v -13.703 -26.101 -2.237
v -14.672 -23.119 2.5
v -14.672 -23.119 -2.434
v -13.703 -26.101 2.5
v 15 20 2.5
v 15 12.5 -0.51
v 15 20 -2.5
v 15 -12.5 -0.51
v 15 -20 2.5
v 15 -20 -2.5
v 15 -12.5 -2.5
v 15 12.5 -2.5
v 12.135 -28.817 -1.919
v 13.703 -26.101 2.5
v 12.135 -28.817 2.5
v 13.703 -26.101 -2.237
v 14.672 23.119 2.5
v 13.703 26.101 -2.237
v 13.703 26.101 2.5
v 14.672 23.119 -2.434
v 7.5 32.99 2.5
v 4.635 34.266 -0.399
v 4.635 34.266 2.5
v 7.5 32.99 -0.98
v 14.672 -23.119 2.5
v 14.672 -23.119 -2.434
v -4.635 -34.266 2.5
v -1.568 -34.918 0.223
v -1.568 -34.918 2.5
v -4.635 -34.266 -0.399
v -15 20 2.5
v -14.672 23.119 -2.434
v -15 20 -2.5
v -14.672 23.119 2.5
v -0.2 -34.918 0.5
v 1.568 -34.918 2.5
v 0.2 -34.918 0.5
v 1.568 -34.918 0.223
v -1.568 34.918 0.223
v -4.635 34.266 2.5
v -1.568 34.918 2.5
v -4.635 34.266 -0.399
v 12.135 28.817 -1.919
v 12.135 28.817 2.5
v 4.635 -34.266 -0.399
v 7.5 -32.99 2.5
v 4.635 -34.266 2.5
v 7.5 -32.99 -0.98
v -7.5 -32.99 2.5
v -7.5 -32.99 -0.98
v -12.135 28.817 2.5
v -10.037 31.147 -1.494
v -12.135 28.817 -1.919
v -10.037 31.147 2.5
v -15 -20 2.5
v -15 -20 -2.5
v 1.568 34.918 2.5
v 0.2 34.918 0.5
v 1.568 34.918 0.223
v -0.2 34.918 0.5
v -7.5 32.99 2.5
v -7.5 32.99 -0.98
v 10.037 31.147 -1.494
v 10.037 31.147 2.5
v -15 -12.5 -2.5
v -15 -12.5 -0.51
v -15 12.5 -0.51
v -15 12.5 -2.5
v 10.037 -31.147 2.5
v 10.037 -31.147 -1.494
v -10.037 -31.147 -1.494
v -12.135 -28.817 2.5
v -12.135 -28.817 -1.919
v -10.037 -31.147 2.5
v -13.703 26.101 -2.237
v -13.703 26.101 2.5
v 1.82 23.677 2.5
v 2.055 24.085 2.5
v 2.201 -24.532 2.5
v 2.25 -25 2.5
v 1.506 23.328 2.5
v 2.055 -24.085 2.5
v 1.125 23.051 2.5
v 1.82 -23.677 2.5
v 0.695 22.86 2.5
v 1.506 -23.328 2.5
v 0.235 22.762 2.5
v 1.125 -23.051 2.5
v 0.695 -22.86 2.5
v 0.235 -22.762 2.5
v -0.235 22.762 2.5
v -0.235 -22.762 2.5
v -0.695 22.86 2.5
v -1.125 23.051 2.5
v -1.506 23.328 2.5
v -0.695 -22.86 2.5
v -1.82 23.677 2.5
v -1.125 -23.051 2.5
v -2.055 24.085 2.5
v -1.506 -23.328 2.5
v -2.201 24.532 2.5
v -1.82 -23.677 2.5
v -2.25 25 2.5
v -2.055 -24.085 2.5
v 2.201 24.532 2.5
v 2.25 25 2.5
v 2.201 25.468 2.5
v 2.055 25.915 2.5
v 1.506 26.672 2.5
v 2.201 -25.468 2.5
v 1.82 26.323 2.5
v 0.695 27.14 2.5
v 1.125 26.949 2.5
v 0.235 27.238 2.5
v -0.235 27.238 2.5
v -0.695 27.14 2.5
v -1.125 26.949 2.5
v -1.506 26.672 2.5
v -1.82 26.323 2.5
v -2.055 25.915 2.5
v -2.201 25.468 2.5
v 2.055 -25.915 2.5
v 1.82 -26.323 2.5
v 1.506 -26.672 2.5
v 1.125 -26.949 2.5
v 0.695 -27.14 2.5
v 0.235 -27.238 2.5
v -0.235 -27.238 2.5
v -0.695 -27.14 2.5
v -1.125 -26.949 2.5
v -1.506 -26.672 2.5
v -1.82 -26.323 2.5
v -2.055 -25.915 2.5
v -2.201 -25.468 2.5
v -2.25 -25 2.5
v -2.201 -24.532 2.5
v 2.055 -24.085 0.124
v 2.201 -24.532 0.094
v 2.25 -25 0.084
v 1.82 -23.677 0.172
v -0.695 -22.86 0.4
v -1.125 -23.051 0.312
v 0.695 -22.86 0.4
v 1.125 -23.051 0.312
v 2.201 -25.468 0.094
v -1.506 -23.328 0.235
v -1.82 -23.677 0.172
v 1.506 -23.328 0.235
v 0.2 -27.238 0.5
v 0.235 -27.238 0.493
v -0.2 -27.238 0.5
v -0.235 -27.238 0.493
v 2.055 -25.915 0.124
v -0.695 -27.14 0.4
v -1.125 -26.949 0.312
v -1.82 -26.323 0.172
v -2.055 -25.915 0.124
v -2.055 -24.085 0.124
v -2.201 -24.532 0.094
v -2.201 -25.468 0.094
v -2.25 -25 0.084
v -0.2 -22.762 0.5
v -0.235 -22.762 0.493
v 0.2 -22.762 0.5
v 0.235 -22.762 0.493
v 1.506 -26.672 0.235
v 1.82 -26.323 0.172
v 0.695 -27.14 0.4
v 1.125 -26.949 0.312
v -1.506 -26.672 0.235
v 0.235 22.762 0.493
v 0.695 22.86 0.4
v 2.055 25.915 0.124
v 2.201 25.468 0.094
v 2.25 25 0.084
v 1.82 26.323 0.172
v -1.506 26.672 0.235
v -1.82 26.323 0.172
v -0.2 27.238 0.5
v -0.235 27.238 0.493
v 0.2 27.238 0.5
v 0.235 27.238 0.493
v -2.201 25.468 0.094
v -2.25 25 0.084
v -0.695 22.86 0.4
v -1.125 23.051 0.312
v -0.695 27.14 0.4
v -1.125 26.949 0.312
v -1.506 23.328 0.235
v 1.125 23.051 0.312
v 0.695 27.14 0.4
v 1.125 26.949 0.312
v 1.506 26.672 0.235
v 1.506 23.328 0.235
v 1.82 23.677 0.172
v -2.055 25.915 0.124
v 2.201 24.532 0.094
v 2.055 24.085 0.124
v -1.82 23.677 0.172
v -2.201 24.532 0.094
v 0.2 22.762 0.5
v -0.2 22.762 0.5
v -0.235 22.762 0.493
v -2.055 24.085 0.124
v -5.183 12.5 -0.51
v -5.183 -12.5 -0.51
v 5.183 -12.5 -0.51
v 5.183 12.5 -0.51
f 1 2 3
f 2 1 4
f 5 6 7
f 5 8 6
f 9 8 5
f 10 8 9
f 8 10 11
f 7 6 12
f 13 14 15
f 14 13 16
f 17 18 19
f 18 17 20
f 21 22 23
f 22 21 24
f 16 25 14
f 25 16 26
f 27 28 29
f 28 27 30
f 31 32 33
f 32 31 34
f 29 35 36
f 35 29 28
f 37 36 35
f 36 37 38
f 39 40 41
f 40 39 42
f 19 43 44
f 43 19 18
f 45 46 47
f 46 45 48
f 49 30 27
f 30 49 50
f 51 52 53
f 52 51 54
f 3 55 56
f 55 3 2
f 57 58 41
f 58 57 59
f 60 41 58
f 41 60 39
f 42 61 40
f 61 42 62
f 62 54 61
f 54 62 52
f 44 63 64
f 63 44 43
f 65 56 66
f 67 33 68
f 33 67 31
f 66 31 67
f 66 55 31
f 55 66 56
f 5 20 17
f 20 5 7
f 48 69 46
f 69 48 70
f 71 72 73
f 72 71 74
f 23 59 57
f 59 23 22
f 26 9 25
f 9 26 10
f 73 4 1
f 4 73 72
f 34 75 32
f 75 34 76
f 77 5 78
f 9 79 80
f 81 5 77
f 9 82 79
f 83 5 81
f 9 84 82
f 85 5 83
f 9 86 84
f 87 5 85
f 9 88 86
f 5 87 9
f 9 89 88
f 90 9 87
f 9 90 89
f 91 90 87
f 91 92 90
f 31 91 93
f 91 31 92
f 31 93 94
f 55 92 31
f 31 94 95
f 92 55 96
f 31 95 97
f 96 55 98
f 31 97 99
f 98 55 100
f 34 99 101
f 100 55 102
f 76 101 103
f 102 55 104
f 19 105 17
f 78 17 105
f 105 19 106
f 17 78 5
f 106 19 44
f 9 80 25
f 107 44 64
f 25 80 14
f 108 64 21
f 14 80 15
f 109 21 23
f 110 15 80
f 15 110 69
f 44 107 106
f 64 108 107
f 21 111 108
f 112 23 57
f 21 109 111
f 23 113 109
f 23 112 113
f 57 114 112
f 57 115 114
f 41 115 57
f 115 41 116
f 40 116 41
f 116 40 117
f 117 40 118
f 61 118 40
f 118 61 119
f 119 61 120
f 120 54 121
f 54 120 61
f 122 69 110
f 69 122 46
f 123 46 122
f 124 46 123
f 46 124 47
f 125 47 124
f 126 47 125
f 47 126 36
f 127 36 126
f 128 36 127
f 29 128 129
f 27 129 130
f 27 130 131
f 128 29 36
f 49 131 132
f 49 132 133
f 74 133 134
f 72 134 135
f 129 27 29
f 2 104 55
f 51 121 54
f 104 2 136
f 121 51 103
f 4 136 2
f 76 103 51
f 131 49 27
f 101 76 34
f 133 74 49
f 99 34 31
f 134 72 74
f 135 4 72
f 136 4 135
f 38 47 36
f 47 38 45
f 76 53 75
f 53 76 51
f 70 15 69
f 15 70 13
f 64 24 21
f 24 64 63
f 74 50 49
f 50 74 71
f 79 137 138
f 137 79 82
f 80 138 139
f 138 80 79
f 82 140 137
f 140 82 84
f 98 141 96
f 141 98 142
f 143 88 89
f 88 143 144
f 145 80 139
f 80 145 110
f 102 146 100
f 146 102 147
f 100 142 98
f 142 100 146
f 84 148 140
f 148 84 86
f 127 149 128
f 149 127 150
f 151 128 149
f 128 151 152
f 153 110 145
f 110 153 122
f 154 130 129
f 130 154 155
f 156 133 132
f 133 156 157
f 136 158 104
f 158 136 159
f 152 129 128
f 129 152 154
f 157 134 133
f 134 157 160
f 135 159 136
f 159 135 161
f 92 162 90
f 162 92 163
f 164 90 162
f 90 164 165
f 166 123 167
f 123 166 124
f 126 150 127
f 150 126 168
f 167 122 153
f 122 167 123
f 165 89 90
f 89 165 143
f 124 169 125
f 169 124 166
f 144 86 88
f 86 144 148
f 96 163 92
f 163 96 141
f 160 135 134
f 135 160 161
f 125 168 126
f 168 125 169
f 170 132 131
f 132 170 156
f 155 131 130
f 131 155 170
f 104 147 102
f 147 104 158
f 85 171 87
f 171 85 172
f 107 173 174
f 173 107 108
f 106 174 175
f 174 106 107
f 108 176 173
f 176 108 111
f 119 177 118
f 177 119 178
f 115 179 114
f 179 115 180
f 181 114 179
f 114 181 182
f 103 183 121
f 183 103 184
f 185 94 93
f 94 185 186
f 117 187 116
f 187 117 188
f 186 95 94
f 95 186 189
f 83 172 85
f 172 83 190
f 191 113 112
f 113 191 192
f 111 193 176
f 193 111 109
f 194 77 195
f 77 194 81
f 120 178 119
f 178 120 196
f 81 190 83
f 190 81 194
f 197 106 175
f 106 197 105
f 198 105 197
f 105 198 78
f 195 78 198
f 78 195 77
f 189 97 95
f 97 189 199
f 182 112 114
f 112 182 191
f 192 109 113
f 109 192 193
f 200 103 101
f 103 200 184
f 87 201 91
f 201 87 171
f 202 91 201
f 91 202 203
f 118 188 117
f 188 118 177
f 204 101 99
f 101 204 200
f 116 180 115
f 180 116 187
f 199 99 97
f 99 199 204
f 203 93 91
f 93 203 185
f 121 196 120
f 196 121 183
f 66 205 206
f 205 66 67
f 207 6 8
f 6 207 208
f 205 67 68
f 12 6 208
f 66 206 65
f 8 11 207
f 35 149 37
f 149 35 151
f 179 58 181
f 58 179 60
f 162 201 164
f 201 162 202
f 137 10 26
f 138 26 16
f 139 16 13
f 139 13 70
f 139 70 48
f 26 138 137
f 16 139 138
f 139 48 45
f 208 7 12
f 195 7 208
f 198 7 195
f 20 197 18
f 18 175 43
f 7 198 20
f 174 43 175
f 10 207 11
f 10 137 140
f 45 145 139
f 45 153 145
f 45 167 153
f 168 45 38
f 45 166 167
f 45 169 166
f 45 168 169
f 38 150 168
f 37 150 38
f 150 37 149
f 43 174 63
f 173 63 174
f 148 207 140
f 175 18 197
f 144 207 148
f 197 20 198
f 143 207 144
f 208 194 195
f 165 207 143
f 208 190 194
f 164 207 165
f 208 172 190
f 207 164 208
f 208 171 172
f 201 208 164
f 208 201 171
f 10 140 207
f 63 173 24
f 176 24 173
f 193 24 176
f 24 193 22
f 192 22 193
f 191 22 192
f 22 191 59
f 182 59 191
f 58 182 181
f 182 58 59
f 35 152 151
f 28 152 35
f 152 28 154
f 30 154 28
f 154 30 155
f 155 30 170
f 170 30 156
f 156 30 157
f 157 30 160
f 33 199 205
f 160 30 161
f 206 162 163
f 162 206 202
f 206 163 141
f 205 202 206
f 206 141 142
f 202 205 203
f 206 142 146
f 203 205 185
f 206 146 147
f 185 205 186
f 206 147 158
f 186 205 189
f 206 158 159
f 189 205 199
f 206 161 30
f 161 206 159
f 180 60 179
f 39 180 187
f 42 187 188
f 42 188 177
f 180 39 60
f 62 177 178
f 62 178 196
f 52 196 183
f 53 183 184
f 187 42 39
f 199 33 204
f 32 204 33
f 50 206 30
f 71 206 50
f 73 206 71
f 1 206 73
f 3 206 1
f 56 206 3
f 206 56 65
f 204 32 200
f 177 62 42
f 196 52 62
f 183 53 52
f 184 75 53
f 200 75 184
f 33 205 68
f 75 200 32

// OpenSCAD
$fn = 30;

// not recommended but if you dont have flat screws
counterbore = "off"; //["on", "off"]

module screw(hole = 4.5, height=3, head = 8){
    cylinder(30,d=hole, center=true);
    if(counterbore != "off"){
        cylinder(h = height, d1 = hole, d2 = head);
    }
}



difference(){
    hull(){
        translate([0,-20,0])
            cylinder(h=5, d=30, center=true);
        translate([0,+20,0])
            cylinder(h=5, d=30, center=true);
    }
    translate([0,-25,-0.49])
         screw();
    translate([0,25,-0.49])
         screw();
    //strap
    translate([0,0,-1.51])
         cube([32, 25,2], center = true); 
    // fusulage shape
    translate([-15,35,-2.5])
    rotate([0,0,-90])
        trapez3d();
}




module trapez(bottom = 30, top = 25, height = 10){
    off = (bottom-top);
    CubePoints = [
  [  0,  0,  0 ],  //0
  [ 0,  bottom,  0 ],  //1
  [ 0,  bottom-off,  height ],  //2
  [  0,  off,  height ]  //3
];
CubeFaces = [
  [0,1,2,3]  // bottom
  ]; // left

polyhedron( CubePoints, CubeFaces );
}



module trapez3d(bottom = 30, top = 14.8, height = 3, length = 70){
    hull(){
            trapez(bottom, top, height);
            translate([length,0,0])
            trapez(bottom, top, height);
    }
}
